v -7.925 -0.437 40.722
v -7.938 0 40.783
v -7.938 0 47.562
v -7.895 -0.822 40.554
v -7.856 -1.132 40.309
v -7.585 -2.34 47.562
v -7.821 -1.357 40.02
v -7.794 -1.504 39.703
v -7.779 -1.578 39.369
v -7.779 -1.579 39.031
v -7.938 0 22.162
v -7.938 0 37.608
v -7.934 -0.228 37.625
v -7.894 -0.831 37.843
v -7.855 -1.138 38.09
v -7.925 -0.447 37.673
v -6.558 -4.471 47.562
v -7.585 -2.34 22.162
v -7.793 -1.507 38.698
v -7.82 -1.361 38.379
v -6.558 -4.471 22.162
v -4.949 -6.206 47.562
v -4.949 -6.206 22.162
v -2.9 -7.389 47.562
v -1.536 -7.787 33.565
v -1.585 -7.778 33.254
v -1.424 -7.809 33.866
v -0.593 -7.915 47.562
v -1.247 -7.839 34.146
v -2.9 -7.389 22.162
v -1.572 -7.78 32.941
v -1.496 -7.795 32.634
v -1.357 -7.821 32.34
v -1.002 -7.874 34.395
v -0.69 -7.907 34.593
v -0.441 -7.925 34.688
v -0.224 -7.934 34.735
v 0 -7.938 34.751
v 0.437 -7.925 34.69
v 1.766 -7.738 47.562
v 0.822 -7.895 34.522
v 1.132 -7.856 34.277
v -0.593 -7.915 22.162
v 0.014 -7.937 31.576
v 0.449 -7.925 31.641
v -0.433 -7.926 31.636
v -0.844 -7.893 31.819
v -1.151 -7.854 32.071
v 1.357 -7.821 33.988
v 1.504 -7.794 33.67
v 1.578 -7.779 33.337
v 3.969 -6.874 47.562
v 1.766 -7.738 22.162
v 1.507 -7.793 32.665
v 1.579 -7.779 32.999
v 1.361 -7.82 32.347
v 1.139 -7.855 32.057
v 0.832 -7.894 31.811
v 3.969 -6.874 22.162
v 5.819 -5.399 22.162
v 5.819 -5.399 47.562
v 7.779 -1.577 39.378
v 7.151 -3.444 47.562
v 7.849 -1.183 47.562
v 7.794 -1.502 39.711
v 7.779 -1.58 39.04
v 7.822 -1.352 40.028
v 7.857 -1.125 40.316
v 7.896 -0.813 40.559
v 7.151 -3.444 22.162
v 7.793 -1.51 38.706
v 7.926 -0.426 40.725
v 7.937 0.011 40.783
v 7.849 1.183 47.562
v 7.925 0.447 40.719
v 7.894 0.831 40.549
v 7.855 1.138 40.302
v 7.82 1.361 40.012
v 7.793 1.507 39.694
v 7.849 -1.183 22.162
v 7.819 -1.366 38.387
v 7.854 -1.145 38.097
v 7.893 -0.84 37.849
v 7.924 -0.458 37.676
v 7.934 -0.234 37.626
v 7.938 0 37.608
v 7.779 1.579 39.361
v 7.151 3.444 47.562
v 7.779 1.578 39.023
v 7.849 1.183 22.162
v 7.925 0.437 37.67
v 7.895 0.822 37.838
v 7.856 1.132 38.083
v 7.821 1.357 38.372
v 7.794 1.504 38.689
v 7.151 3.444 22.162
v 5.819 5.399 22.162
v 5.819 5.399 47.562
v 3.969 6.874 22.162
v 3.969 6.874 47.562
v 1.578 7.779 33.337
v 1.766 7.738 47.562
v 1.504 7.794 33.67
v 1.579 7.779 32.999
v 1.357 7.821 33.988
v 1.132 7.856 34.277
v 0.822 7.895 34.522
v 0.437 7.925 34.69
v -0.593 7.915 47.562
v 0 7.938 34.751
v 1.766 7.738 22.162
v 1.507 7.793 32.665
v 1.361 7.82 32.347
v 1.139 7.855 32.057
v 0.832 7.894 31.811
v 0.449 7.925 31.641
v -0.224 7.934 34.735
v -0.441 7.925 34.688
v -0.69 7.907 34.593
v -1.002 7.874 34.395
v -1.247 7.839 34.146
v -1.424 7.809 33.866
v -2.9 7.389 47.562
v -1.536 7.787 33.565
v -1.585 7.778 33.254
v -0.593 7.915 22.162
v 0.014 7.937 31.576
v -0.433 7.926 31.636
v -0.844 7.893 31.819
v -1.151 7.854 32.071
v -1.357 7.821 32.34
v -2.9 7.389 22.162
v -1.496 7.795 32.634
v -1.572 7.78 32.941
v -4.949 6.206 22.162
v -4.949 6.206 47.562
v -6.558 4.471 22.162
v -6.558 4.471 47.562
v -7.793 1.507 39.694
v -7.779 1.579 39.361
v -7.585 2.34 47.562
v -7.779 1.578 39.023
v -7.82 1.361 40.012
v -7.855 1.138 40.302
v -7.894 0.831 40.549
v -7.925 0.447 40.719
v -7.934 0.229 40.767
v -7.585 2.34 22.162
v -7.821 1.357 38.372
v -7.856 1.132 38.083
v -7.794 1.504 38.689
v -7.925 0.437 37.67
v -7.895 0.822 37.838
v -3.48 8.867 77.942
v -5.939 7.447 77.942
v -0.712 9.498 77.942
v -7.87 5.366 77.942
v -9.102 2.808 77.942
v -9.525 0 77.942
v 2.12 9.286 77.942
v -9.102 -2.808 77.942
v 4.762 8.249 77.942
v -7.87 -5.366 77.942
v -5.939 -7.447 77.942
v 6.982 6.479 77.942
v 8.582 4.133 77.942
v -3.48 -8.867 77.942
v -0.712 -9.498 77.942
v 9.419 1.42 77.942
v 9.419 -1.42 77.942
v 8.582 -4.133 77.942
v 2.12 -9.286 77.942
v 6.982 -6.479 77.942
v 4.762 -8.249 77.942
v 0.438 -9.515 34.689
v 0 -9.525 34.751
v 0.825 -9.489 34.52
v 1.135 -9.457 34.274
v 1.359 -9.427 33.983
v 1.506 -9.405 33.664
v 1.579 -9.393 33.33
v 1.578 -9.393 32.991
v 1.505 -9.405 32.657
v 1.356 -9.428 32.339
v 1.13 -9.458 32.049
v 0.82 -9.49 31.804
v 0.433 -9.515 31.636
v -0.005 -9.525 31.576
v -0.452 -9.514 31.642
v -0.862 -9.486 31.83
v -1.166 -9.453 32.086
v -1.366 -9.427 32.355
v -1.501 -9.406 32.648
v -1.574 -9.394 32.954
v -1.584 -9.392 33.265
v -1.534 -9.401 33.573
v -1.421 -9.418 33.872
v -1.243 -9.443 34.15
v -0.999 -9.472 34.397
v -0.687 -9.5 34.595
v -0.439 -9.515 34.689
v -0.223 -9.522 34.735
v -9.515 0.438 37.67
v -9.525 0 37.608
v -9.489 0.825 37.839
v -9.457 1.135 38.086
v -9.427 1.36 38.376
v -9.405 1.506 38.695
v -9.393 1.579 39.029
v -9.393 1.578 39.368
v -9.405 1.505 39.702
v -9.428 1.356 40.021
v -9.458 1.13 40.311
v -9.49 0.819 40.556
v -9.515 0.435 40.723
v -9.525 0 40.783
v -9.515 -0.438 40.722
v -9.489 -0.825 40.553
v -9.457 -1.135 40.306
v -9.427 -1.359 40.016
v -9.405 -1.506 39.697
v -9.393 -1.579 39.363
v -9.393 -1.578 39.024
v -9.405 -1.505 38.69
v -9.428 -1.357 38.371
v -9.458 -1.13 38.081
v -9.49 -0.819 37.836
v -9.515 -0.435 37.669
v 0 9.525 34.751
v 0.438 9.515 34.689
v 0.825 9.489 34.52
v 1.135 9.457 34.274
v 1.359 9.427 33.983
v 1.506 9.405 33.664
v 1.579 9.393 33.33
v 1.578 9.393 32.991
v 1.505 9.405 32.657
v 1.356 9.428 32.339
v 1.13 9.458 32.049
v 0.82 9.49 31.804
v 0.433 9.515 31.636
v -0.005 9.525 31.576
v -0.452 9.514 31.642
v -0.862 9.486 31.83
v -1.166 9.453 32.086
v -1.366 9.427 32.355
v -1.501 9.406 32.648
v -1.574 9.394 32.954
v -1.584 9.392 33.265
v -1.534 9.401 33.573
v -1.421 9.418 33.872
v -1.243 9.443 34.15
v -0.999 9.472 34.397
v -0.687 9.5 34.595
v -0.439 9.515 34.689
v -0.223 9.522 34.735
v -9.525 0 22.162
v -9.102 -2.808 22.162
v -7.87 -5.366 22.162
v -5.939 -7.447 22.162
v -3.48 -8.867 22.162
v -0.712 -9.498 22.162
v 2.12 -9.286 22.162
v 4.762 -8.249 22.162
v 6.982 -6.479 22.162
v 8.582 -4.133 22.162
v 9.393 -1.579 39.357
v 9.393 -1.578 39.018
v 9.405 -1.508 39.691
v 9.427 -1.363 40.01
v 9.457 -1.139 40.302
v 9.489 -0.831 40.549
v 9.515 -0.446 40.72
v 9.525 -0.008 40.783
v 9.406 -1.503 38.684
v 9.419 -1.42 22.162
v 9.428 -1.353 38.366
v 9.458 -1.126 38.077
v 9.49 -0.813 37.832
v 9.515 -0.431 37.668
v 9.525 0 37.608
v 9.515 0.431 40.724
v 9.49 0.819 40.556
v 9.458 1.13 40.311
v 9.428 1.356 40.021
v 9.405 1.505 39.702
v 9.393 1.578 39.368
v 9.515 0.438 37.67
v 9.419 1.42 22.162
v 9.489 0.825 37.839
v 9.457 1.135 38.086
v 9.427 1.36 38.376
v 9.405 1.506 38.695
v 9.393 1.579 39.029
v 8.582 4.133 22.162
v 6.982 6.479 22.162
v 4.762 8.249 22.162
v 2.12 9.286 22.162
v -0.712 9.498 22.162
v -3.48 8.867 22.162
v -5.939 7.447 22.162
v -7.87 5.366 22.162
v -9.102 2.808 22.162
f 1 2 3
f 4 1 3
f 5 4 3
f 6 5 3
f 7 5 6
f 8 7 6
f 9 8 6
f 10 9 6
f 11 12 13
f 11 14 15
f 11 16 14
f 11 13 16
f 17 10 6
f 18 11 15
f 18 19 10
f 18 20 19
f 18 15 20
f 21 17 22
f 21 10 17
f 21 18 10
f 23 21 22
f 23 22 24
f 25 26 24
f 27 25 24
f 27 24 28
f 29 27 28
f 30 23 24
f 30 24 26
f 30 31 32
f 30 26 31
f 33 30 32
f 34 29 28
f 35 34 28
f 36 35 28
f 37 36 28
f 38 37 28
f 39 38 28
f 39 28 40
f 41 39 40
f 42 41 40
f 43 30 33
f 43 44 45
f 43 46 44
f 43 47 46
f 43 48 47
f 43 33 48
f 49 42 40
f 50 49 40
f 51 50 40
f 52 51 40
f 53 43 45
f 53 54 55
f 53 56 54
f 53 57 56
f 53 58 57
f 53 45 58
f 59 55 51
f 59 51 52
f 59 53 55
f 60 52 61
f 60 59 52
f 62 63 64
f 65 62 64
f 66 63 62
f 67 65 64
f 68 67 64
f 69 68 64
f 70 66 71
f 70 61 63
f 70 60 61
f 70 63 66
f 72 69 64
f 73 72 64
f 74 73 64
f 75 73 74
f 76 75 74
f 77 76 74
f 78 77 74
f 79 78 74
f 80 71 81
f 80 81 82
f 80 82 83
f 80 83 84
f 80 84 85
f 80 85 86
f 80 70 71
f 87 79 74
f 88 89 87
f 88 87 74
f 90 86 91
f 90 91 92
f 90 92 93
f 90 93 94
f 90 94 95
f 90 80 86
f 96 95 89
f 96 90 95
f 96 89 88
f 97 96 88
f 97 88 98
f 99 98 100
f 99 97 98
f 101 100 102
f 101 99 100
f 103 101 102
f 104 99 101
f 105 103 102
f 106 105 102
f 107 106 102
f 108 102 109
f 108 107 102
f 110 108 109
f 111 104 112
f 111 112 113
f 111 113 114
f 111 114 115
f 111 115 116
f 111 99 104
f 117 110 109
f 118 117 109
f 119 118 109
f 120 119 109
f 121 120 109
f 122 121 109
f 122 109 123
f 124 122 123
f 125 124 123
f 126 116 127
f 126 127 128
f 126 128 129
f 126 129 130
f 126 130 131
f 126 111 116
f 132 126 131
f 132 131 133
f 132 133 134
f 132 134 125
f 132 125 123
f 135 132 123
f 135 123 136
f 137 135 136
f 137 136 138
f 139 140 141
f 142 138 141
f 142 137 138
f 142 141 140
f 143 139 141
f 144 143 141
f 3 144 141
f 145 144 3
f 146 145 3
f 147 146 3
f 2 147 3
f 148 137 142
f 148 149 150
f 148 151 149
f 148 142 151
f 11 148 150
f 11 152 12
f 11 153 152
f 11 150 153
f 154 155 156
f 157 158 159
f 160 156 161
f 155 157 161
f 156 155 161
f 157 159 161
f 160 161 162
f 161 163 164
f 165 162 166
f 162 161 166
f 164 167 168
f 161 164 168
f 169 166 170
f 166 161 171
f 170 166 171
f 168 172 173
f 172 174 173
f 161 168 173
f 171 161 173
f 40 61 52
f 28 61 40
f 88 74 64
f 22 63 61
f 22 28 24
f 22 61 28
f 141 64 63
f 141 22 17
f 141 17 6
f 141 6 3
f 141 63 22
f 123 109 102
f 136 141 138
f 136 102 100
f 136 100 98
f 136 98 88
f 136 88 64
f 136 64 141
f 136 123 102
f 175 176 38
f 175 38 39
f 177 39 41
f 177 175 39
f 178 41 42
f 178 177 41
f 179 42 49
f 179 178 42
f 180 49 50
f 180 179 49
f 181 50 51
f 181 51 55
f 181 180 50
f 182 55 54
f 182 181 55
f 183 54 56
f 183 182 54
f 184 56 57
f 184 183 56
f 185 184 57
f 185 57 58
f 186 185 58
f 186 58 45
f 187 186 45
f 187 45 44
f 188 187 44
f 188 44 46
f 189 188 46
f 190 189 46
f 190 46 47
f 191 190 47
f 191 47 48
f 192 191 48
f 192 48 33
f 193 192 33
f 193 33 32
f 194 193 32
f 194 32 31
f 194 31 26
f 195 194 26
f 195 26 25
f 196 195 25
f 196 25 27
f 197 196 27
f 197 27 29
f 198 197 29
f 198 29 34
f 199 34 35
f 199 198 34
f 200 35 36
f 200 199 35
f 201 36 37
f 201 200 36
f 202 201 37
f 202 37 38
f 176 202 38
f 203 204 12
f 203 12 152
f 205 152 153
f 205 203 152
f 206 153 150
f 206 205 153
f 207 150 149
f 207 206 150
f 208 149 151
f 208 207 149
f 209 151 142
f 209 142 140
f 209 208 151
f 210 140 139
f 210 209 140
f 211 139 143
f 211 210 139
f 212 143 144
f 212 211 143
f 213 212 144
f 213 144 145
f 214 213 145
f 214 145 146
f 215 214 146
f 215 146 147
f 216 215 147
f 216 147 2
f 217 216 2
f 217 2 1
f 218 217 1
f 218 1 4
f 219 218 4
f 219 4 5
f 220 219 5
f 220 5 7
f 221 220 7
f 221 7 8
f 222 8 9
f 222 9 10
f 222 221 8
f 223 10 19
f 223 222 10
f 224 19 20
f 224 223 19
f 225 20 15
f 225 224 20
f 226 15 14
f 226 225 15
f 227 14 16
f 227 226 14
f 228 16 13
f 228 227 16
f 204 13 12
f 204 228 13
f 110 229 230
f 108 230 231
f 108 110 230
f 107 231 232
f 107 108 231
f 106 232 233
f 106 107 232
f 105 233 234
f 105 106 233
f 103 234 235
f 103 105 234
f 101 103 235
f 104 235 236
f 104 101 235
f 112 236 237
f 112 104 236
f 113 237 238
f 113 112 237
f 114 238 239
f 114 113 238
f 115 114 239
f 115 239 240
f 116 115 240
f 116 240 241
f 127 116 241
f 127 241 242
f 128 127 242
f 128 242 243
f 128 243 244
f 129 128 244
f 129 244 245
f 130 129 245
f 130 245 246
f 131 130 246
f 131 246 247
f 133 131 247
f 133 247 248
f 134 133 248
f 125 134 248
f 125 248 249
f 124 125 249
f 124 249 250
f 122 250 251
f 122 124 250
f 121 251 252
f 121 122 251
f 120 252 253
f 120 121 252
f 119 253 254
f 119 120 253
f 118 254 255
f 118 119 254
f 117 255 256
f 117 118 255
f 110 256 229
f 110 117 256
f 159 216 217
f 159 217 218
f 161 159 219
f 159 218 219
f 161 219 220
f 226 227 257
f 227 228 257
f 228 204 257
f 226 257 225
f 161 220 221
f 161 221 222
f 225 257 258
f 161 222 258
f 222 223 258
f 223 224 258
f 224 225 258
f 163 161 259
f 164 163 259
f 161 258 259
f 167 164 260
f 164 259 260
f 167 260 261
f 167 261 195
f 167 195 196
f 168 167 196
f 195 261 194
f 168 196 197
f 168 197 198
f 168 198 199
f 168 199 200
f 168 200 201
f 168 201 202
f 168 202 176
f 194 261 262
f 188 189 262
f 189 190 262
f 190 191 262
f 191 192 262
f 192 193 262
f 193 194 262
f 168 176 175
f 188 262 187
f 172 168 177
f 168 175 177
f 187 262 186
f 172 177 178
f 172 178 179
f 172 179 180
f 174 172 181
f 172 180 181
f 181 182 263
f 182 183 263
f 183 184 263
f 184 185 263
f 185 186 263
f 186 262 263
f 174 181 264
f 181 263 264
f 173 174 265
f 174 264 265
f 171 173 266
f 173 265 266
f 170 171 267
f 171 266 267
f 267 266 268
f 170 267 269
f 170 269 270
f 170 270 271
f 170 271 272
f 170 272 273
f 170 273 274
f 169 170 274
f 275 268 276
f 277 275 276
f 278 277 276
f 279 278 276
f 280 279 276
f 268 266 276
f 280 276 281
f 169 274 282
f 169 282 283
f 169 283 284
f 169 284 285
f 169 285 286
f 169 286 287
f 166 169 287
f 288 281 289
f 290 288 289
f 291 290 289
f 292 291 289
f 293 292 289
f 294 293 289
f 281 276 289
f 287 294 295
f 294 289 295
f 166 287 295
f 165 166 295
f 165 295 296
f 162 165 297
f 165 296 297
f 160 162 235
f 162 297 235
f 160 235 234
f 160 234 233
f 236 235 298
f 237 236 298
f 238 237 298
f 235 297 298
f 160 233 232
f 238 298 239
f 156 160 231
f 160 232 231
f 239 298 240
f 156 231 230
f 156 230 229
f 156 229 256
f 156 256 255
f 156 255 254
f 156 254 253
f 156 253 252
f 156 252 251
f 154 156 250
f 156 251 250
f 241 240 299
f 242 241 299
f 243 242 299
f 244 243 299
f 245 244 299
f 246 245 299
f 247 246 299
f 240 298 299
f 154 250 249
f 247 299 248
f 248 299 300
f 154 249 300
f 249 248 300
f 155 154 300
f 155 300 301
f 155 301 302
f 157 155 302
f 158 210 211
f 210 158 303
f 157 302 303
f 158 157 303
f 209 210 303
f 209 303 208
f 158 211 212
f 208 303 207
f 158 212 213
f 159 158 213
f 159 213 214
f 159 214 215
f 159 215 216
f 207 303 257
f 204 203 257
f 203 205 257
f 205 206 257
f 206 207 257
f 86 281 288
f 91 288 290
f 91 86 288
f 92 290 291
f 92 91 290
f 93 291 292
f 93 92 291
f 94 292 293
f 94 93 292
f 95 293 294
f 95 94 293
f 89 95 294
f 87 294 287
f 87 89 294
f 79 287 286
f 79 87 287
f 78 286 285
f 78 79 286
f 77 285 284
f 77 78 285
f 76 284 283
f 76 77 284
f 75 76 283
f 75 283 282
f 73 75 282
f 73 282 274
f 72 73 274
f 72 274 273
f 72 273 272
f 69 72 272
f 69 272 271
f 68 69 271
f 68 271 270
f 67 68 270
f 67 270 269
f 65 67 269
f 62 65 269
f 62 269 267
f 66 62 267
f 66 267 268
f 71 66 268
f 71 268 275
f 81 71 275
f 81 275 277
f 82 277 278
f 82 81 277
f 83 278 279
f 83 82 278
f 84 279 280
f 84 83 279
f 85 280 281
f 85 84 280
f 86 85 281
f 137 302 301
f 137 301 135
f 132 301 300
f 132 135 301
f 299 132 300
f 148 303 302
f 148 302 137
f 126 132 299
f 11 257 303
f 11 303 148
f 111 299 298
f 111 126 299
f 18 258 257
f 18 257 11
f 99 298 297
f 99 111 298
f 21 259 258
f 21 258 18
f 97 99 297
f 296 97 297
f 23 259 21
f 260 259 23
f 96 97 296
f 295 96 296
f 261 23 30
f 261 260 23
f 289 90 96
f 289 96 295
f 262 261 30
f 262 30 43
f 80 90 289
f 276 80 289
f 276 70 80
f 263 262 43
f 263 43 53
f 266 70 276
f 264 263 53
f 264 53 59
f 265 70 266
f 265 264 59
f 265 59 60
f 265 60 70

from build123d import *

# Parameters (mm, degrees)
SKETCH5_W               = 1.587499994
SKETCH5_H               = 55.780081988
CUT_EXTRUDE5_DEPTH      = 80.097038204
CUT_EXTRUDE5_DEPTH_BACK = 80.097038204
SKETCH7_R               = 1.5875
CUT_EXTRUDE6_DEPTH      = 80.097038326
CUT_EXTRUDE6_DEPTH_BACK = 80.097038326
SKETCH6_R               = 1.5875
SKETCH10_R              = 7.9375
BOSS_EXTRUDE1_DEPTH     = 30.380081988


with BuildPart() as part:
    # Sketch5 → Revolve2 (revolve)
    with BuildSketch(Plane(origin=(0, 0, 0), x_dir=(1, 0, 0), z_dir=(0, 1, 0)), mode=Mode.PRIVATE) as revolve2_sk:
        with Locations((8.731249997, -50.051540994)):
            Rectangle(SKETCH5_W, SKETCH5_H)
    revolve(revolve2_sk.sketch.rotate(Axis((0, 0, 0), (0, 0, 1)), 180), axis=Axis((0, 0, 0), (0, 0, 1)))

    # Sketch7 → Cut-Extrude5 (cut, two sides: drawn at the far end of the back side and taken through both)
    with BuildSketch(Plane(origin=(0, 0, 0), x_dir=(0, 0, -1), z_dir=(1, 0, 0)).offset(-CUT_EXTRUDE5_DEPTH_BACK)):
        with Locations((-39.195999993, 0)):
            Circle(SKETCH7_R)
    extrude(amount=CUT_EXTRUDE5_DEPTH + CUT_EXTRUDE5_DEPTH_BACK, mode=Mode.SUBTRACT)

    # Sketch6 → Cut-Extrude6 (cut, two sides: drawn at the far end of the back side and taken through both)
    with BuildSketch(Plane(origin=(0, 0, 0), x_dir=(1, 0, 0), z_dir=(0, 1, 0)).offset(-CUT_EXTRUDE6_DEPTH_BACK)):
        with Locations(Location((1e-09, -33.163499999, 0), (0, 0, 269.999999955))):
            Circle(SKETCH6_R)
    extrude(amount=CUT_EXTRUDE6_DEPTH + CUT_EXTRUDE6_DEPTH_BACK, mode=Mode.SUBTRACT)

    # Sketch10 → Boss-Extrude1 (add)
    with BuildSketch(Plane(origin=(0, 0, 47.5615), x_dir=(-1, 0, 0), z_dir=(0, 0, -1))):
        Circle(SKETCH10_R)
    extrude(amount=-BOSS_EXTRUDE1_DEPTH)


solid = part.part
